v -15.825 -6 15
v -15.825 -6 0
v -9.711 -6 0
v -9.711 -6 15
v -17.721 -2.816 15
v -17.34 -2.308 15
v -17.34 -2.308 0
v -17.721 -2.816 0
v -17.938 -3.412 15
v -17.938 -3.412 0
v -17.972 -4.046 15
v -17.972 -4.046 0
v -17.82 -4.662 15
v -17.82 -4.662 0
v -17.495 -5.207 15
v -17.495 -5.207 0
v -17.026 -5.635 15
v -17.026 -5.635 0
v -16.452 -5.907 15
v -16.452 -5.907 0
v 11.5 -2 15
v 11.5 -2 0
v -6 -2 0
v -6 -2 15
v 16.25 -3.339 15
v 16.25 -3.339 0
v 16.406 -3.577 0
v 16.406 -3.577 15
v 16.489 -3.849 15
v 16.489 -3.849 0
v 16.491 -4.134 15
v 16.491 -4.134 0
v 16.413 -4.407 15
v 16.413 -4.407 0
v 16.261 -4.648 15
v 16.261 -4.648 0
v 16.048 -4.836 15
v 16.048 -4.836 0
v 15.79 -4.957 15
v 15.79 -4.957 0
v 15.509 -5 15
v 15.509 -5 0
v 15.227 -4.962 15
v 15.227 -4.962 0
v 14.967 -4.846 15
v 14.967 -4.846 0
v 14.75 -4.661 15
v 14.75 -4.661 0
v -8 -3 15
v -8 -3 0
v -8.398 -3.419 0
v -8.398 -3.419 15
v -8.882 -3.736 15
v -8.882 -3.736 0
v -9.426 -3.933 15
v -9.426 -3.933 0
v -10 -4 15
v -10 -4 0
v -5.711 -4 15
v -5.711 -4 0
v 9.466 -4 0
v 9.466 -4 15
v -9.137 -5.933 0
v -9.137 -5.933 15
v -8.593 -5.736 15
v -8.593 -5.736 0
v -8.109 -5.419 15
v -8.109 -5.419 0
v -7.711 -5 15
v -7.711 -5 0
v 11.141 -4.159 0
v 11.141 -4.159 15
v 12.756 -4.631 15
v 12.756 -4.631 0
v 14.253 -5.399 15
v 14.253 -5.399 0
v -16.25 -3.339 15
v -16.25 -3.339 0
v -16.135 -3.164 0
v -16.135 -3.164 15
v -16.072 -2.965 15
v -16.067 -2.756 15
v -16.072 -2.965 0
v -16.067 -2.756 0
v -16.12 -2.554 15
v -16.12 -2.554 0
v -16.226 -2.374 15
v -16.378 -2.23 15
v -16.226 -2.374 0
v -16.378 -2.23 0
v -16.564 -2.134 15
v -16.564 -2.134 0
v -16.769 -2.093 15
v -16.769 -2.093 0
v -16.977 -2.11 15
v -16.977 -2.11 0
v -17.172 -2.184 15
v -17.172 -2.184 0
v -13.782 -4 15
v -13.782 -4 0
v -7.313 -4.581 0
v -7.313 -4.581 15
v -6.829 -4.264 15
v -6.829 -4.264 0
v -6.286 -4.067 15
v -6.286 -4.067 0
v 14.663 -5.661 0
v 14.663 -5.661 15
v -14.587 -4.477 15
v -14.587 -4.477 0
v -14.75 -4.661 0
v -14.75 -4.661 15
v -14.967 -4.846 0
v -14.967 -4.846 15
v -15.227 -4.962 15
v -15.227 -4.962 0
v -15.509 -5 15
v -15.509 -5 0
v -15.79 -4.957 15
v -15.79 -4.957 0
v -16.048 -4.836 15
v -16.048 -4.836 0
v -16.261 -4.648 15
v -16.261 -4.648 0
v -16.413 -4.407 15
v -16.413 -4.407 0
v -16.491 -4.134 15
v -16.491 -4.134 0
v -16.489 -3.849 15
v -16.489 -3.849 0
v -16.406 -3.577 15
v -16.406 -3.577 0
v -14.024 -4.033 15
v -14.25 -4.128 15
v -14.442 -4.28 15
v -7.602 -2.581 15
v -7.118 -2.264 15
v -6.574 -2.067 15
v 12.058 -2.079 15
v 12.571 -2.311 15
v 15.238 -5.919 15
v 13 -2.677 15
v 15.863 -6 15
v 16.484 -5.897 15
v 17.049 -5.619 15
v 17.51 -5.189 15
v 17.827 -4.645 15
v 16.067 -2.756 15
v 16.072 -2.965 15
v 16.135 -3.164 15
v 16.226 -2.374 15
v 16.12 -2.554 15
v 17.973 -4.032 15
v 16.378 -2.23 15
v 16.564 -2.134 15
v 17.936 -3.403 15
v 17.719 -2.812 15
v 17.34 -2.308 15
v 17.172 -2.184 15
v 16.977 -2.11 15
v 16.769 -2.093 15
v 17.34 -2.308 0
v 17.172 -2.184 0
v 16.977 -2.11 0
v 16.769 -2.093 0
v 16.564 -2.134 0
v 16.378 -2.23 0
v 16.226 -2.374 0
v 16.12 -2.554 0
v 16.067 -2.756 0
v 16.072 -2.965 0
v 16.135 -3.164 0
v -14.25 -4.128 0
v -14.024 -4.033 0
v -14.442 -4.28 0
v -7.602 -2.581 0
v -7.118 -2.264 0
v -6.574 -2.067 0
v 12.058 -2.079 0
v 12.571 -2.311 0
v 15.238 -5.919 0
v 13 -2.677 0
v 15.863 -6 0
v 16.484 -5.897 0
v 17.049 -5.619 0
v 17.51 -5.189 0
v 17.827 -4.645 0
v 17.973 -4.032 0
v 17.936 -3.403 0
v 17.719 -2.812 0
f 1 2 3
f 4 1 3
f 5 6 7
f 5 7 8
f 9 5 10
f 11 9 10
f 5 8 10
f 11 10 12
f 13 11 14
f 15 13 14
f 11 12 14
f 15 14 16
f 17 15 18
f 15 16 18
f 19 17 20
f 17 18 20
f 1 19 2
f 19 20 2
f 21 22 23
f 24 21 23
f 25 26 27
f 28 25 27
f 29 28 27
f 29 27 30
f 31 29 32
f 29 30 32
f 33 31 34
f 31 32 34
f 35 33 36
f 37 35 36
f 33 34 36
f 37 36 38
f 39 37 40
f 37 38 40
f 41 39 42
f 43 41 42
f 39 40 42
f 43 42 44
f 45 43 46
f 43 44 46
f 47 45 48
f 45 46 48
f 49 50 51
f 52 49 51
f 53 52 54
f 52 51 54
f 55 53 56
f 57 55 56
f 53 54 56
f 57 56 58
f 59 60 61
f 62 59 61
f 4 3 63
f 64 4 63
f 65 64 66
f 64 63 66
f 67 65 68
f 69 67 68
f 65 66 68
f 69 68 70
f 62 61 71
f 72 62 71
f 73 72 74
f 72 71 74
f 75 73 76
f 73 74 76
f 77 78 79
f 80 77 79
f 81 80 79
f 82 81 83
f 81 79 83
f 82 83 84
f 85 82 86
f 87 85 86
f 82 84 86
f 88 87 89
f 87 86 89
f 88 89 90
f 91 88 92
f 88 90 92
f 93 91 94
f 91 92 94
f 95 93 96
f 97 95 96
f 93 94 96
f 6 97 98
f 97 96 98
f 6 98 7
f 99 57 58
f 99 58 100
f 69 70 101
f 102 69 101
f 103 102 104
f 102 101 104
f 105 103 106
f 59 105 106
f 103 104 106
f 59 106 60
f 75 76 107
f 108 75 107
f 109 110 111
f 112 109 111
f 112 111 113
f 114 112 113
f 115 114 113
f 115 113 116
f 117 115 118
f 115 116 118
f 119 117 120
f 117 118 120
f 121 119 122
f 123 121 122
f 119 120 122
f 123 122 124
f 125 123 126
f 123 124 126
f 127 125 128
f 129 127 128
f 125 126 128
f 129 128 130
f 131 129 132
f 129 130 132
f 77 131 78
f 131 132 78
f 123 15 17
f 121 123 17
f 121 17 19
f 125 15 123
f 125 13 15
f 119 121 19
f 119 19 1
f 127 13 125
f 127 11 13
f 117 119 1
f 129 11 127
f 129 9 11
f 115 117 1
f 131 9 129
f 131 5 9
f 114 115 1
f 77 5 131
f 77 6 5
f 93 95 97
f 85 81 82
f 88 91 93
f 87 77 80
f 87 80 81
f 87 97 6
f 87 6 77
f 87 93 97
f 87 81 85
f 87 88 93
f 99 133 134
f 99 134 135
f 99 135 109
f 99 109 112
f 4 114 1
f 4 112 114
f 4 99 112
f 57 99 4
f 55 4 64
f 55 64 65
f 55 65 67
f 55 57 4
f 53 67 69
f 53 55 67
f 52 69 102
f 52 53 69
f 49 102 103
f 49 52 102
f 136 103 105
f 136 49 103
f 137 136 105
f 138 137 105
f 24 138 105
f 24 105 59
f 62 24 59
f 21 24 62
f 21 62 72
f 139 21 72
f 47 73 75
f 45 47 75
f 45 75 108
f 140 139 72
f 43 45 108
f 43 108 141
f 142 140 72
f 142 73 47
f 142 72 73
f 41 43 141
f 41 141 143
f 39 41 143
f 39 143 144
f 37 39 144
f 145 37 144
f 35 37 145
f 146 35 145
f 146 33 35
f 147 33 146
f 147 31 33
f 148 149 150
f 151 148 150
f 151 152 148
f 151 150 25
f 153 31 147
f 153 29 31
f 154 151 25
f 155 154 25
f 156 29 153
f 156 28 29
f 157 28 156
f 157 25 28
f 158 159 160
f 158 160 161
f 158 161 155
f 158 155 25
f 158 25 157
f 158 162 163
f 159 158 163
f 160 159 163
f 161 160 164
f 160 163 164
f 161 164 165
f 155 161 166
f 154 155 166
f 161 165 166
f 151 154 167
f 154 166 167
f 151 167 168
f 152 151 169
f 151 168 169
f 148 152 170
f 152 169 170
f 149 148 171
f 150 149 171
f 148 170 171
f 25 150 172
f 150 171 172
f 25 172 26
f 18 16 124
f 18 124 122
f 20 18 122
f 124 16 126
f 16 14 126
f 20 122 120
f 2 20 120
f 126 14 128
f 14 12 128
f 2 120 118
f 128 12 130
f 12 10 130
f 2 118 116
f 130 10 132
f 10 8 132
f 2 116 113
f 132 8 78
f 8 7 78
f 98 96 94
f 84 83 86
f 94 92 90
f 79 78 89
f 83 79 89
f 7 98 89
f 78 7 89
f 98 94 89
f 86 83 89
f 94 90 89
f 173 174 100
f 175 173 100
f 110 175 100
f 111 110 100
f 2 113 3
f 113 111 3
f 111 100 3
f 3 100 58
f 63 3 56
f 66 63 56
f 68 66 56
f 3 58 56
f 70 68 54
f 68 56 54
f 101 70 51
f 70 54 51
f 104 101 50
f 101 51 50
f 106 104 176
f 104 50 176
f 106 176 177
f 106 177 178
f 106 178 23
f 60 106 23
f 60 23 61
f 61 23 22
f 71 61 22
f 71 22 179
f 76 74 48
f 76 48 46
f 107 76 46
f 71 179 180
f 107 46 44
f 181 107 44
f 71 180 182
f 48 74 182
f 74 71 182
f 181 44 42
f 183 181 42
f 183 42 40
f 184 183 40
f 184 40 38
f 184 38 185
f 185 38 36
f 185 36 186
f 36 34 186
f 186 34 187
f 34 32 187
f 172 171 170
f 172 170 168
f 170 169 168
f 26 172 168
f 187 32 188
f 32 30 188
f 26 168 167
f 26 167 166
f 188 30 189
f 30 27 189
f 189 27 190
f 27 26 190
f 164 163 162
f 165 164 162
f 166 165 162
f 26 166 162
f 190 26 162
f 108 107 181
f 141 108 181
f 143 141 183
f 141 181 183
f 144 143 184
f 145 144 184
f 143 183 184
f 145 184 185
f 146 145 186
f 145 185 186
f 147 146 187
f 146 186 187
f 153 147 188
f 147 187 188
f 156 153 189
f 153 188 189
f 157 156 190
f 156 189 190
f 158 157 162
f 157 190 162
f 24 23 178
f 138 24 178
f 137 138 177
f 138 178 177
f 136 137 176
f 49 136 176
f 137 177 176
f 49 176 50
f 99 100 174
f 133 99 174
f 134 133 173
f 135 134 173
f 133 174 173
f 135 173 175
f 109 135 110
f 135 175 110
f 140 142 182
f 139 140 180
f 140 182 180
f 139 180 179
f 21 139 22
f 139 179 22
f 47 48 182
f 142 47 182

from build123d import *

# Parameters (mm, degrees)
F1_DEPTH = 15


with BuildPart() as f1:
    # F0 (on Top) → F1 (new body)
    with BuildSketch(Plane.XY):
        with BuildLine():
            Line((11.5, -2), (-6, -2))
            ThreePointArc((-6, -2), (-7.118034, -2.263932), (-8, -3))
            ThreePointArc((-8, -3), (-8.881966, -3.736068), (-10, -4))
            Line((-10, -4), (-13.781936, -4))
            ThreePointArc((-13.781936, -4), (-14.249819, -4.128131), (-14.587137, -4.476769))
            Line((-14.587137, -4.476769), (-14.75, -4.661438))
            ThreePointArc((-14.75, -4.661438), (-16.161438, -4.75), (-16.25, -3.338562))
            ThreePointArc((-16.25, -3.338562), (-16.297339, -2.296813), (-17.340101, -2.308184))
            ThreePointArc((-17.340101, -2.308184), (-17.819996, -4.662142), (-15.824614, -6))
            Line((-15.824614, -6), (-9.711234, -6))
            ThreePointArc((-9.711234, -6), (-8.5932, -5.736068), (-7.711234, -5))
            ThreePointArc((-7.711234, -5), (-6.829268, -4.263932), (-5.711234, -4))
            Line((-5.711234, -4), (9.466364, -4))
            ThreePointArc((9.466364, -4), (11.959979, -4.356858), (14.253416, -5.398784))
            Line((14.253416, -5.398784), (14.663239, -5.660644))
            ThreePointArc((14.663239, -5.660644), (17.510169, -5.188916), (17.340101, -2.308184))
            ThreePointArc((17.340101, -2.308184), (16.297339, -2.296813), (16.25, -3.338562))
            ThreePointArc((16.25, -3.338562), (16.161438, -4.75), (14.75, -4.661438))
            Line((14.75, -4.661438), (13, -2.677124))
            ThreePointArc((13, -2.677124), (12.322876, -2.177124), (11.5, -2))
        make_face()
    extrude(amount=F1_DEPTH)


solid = f1.part
